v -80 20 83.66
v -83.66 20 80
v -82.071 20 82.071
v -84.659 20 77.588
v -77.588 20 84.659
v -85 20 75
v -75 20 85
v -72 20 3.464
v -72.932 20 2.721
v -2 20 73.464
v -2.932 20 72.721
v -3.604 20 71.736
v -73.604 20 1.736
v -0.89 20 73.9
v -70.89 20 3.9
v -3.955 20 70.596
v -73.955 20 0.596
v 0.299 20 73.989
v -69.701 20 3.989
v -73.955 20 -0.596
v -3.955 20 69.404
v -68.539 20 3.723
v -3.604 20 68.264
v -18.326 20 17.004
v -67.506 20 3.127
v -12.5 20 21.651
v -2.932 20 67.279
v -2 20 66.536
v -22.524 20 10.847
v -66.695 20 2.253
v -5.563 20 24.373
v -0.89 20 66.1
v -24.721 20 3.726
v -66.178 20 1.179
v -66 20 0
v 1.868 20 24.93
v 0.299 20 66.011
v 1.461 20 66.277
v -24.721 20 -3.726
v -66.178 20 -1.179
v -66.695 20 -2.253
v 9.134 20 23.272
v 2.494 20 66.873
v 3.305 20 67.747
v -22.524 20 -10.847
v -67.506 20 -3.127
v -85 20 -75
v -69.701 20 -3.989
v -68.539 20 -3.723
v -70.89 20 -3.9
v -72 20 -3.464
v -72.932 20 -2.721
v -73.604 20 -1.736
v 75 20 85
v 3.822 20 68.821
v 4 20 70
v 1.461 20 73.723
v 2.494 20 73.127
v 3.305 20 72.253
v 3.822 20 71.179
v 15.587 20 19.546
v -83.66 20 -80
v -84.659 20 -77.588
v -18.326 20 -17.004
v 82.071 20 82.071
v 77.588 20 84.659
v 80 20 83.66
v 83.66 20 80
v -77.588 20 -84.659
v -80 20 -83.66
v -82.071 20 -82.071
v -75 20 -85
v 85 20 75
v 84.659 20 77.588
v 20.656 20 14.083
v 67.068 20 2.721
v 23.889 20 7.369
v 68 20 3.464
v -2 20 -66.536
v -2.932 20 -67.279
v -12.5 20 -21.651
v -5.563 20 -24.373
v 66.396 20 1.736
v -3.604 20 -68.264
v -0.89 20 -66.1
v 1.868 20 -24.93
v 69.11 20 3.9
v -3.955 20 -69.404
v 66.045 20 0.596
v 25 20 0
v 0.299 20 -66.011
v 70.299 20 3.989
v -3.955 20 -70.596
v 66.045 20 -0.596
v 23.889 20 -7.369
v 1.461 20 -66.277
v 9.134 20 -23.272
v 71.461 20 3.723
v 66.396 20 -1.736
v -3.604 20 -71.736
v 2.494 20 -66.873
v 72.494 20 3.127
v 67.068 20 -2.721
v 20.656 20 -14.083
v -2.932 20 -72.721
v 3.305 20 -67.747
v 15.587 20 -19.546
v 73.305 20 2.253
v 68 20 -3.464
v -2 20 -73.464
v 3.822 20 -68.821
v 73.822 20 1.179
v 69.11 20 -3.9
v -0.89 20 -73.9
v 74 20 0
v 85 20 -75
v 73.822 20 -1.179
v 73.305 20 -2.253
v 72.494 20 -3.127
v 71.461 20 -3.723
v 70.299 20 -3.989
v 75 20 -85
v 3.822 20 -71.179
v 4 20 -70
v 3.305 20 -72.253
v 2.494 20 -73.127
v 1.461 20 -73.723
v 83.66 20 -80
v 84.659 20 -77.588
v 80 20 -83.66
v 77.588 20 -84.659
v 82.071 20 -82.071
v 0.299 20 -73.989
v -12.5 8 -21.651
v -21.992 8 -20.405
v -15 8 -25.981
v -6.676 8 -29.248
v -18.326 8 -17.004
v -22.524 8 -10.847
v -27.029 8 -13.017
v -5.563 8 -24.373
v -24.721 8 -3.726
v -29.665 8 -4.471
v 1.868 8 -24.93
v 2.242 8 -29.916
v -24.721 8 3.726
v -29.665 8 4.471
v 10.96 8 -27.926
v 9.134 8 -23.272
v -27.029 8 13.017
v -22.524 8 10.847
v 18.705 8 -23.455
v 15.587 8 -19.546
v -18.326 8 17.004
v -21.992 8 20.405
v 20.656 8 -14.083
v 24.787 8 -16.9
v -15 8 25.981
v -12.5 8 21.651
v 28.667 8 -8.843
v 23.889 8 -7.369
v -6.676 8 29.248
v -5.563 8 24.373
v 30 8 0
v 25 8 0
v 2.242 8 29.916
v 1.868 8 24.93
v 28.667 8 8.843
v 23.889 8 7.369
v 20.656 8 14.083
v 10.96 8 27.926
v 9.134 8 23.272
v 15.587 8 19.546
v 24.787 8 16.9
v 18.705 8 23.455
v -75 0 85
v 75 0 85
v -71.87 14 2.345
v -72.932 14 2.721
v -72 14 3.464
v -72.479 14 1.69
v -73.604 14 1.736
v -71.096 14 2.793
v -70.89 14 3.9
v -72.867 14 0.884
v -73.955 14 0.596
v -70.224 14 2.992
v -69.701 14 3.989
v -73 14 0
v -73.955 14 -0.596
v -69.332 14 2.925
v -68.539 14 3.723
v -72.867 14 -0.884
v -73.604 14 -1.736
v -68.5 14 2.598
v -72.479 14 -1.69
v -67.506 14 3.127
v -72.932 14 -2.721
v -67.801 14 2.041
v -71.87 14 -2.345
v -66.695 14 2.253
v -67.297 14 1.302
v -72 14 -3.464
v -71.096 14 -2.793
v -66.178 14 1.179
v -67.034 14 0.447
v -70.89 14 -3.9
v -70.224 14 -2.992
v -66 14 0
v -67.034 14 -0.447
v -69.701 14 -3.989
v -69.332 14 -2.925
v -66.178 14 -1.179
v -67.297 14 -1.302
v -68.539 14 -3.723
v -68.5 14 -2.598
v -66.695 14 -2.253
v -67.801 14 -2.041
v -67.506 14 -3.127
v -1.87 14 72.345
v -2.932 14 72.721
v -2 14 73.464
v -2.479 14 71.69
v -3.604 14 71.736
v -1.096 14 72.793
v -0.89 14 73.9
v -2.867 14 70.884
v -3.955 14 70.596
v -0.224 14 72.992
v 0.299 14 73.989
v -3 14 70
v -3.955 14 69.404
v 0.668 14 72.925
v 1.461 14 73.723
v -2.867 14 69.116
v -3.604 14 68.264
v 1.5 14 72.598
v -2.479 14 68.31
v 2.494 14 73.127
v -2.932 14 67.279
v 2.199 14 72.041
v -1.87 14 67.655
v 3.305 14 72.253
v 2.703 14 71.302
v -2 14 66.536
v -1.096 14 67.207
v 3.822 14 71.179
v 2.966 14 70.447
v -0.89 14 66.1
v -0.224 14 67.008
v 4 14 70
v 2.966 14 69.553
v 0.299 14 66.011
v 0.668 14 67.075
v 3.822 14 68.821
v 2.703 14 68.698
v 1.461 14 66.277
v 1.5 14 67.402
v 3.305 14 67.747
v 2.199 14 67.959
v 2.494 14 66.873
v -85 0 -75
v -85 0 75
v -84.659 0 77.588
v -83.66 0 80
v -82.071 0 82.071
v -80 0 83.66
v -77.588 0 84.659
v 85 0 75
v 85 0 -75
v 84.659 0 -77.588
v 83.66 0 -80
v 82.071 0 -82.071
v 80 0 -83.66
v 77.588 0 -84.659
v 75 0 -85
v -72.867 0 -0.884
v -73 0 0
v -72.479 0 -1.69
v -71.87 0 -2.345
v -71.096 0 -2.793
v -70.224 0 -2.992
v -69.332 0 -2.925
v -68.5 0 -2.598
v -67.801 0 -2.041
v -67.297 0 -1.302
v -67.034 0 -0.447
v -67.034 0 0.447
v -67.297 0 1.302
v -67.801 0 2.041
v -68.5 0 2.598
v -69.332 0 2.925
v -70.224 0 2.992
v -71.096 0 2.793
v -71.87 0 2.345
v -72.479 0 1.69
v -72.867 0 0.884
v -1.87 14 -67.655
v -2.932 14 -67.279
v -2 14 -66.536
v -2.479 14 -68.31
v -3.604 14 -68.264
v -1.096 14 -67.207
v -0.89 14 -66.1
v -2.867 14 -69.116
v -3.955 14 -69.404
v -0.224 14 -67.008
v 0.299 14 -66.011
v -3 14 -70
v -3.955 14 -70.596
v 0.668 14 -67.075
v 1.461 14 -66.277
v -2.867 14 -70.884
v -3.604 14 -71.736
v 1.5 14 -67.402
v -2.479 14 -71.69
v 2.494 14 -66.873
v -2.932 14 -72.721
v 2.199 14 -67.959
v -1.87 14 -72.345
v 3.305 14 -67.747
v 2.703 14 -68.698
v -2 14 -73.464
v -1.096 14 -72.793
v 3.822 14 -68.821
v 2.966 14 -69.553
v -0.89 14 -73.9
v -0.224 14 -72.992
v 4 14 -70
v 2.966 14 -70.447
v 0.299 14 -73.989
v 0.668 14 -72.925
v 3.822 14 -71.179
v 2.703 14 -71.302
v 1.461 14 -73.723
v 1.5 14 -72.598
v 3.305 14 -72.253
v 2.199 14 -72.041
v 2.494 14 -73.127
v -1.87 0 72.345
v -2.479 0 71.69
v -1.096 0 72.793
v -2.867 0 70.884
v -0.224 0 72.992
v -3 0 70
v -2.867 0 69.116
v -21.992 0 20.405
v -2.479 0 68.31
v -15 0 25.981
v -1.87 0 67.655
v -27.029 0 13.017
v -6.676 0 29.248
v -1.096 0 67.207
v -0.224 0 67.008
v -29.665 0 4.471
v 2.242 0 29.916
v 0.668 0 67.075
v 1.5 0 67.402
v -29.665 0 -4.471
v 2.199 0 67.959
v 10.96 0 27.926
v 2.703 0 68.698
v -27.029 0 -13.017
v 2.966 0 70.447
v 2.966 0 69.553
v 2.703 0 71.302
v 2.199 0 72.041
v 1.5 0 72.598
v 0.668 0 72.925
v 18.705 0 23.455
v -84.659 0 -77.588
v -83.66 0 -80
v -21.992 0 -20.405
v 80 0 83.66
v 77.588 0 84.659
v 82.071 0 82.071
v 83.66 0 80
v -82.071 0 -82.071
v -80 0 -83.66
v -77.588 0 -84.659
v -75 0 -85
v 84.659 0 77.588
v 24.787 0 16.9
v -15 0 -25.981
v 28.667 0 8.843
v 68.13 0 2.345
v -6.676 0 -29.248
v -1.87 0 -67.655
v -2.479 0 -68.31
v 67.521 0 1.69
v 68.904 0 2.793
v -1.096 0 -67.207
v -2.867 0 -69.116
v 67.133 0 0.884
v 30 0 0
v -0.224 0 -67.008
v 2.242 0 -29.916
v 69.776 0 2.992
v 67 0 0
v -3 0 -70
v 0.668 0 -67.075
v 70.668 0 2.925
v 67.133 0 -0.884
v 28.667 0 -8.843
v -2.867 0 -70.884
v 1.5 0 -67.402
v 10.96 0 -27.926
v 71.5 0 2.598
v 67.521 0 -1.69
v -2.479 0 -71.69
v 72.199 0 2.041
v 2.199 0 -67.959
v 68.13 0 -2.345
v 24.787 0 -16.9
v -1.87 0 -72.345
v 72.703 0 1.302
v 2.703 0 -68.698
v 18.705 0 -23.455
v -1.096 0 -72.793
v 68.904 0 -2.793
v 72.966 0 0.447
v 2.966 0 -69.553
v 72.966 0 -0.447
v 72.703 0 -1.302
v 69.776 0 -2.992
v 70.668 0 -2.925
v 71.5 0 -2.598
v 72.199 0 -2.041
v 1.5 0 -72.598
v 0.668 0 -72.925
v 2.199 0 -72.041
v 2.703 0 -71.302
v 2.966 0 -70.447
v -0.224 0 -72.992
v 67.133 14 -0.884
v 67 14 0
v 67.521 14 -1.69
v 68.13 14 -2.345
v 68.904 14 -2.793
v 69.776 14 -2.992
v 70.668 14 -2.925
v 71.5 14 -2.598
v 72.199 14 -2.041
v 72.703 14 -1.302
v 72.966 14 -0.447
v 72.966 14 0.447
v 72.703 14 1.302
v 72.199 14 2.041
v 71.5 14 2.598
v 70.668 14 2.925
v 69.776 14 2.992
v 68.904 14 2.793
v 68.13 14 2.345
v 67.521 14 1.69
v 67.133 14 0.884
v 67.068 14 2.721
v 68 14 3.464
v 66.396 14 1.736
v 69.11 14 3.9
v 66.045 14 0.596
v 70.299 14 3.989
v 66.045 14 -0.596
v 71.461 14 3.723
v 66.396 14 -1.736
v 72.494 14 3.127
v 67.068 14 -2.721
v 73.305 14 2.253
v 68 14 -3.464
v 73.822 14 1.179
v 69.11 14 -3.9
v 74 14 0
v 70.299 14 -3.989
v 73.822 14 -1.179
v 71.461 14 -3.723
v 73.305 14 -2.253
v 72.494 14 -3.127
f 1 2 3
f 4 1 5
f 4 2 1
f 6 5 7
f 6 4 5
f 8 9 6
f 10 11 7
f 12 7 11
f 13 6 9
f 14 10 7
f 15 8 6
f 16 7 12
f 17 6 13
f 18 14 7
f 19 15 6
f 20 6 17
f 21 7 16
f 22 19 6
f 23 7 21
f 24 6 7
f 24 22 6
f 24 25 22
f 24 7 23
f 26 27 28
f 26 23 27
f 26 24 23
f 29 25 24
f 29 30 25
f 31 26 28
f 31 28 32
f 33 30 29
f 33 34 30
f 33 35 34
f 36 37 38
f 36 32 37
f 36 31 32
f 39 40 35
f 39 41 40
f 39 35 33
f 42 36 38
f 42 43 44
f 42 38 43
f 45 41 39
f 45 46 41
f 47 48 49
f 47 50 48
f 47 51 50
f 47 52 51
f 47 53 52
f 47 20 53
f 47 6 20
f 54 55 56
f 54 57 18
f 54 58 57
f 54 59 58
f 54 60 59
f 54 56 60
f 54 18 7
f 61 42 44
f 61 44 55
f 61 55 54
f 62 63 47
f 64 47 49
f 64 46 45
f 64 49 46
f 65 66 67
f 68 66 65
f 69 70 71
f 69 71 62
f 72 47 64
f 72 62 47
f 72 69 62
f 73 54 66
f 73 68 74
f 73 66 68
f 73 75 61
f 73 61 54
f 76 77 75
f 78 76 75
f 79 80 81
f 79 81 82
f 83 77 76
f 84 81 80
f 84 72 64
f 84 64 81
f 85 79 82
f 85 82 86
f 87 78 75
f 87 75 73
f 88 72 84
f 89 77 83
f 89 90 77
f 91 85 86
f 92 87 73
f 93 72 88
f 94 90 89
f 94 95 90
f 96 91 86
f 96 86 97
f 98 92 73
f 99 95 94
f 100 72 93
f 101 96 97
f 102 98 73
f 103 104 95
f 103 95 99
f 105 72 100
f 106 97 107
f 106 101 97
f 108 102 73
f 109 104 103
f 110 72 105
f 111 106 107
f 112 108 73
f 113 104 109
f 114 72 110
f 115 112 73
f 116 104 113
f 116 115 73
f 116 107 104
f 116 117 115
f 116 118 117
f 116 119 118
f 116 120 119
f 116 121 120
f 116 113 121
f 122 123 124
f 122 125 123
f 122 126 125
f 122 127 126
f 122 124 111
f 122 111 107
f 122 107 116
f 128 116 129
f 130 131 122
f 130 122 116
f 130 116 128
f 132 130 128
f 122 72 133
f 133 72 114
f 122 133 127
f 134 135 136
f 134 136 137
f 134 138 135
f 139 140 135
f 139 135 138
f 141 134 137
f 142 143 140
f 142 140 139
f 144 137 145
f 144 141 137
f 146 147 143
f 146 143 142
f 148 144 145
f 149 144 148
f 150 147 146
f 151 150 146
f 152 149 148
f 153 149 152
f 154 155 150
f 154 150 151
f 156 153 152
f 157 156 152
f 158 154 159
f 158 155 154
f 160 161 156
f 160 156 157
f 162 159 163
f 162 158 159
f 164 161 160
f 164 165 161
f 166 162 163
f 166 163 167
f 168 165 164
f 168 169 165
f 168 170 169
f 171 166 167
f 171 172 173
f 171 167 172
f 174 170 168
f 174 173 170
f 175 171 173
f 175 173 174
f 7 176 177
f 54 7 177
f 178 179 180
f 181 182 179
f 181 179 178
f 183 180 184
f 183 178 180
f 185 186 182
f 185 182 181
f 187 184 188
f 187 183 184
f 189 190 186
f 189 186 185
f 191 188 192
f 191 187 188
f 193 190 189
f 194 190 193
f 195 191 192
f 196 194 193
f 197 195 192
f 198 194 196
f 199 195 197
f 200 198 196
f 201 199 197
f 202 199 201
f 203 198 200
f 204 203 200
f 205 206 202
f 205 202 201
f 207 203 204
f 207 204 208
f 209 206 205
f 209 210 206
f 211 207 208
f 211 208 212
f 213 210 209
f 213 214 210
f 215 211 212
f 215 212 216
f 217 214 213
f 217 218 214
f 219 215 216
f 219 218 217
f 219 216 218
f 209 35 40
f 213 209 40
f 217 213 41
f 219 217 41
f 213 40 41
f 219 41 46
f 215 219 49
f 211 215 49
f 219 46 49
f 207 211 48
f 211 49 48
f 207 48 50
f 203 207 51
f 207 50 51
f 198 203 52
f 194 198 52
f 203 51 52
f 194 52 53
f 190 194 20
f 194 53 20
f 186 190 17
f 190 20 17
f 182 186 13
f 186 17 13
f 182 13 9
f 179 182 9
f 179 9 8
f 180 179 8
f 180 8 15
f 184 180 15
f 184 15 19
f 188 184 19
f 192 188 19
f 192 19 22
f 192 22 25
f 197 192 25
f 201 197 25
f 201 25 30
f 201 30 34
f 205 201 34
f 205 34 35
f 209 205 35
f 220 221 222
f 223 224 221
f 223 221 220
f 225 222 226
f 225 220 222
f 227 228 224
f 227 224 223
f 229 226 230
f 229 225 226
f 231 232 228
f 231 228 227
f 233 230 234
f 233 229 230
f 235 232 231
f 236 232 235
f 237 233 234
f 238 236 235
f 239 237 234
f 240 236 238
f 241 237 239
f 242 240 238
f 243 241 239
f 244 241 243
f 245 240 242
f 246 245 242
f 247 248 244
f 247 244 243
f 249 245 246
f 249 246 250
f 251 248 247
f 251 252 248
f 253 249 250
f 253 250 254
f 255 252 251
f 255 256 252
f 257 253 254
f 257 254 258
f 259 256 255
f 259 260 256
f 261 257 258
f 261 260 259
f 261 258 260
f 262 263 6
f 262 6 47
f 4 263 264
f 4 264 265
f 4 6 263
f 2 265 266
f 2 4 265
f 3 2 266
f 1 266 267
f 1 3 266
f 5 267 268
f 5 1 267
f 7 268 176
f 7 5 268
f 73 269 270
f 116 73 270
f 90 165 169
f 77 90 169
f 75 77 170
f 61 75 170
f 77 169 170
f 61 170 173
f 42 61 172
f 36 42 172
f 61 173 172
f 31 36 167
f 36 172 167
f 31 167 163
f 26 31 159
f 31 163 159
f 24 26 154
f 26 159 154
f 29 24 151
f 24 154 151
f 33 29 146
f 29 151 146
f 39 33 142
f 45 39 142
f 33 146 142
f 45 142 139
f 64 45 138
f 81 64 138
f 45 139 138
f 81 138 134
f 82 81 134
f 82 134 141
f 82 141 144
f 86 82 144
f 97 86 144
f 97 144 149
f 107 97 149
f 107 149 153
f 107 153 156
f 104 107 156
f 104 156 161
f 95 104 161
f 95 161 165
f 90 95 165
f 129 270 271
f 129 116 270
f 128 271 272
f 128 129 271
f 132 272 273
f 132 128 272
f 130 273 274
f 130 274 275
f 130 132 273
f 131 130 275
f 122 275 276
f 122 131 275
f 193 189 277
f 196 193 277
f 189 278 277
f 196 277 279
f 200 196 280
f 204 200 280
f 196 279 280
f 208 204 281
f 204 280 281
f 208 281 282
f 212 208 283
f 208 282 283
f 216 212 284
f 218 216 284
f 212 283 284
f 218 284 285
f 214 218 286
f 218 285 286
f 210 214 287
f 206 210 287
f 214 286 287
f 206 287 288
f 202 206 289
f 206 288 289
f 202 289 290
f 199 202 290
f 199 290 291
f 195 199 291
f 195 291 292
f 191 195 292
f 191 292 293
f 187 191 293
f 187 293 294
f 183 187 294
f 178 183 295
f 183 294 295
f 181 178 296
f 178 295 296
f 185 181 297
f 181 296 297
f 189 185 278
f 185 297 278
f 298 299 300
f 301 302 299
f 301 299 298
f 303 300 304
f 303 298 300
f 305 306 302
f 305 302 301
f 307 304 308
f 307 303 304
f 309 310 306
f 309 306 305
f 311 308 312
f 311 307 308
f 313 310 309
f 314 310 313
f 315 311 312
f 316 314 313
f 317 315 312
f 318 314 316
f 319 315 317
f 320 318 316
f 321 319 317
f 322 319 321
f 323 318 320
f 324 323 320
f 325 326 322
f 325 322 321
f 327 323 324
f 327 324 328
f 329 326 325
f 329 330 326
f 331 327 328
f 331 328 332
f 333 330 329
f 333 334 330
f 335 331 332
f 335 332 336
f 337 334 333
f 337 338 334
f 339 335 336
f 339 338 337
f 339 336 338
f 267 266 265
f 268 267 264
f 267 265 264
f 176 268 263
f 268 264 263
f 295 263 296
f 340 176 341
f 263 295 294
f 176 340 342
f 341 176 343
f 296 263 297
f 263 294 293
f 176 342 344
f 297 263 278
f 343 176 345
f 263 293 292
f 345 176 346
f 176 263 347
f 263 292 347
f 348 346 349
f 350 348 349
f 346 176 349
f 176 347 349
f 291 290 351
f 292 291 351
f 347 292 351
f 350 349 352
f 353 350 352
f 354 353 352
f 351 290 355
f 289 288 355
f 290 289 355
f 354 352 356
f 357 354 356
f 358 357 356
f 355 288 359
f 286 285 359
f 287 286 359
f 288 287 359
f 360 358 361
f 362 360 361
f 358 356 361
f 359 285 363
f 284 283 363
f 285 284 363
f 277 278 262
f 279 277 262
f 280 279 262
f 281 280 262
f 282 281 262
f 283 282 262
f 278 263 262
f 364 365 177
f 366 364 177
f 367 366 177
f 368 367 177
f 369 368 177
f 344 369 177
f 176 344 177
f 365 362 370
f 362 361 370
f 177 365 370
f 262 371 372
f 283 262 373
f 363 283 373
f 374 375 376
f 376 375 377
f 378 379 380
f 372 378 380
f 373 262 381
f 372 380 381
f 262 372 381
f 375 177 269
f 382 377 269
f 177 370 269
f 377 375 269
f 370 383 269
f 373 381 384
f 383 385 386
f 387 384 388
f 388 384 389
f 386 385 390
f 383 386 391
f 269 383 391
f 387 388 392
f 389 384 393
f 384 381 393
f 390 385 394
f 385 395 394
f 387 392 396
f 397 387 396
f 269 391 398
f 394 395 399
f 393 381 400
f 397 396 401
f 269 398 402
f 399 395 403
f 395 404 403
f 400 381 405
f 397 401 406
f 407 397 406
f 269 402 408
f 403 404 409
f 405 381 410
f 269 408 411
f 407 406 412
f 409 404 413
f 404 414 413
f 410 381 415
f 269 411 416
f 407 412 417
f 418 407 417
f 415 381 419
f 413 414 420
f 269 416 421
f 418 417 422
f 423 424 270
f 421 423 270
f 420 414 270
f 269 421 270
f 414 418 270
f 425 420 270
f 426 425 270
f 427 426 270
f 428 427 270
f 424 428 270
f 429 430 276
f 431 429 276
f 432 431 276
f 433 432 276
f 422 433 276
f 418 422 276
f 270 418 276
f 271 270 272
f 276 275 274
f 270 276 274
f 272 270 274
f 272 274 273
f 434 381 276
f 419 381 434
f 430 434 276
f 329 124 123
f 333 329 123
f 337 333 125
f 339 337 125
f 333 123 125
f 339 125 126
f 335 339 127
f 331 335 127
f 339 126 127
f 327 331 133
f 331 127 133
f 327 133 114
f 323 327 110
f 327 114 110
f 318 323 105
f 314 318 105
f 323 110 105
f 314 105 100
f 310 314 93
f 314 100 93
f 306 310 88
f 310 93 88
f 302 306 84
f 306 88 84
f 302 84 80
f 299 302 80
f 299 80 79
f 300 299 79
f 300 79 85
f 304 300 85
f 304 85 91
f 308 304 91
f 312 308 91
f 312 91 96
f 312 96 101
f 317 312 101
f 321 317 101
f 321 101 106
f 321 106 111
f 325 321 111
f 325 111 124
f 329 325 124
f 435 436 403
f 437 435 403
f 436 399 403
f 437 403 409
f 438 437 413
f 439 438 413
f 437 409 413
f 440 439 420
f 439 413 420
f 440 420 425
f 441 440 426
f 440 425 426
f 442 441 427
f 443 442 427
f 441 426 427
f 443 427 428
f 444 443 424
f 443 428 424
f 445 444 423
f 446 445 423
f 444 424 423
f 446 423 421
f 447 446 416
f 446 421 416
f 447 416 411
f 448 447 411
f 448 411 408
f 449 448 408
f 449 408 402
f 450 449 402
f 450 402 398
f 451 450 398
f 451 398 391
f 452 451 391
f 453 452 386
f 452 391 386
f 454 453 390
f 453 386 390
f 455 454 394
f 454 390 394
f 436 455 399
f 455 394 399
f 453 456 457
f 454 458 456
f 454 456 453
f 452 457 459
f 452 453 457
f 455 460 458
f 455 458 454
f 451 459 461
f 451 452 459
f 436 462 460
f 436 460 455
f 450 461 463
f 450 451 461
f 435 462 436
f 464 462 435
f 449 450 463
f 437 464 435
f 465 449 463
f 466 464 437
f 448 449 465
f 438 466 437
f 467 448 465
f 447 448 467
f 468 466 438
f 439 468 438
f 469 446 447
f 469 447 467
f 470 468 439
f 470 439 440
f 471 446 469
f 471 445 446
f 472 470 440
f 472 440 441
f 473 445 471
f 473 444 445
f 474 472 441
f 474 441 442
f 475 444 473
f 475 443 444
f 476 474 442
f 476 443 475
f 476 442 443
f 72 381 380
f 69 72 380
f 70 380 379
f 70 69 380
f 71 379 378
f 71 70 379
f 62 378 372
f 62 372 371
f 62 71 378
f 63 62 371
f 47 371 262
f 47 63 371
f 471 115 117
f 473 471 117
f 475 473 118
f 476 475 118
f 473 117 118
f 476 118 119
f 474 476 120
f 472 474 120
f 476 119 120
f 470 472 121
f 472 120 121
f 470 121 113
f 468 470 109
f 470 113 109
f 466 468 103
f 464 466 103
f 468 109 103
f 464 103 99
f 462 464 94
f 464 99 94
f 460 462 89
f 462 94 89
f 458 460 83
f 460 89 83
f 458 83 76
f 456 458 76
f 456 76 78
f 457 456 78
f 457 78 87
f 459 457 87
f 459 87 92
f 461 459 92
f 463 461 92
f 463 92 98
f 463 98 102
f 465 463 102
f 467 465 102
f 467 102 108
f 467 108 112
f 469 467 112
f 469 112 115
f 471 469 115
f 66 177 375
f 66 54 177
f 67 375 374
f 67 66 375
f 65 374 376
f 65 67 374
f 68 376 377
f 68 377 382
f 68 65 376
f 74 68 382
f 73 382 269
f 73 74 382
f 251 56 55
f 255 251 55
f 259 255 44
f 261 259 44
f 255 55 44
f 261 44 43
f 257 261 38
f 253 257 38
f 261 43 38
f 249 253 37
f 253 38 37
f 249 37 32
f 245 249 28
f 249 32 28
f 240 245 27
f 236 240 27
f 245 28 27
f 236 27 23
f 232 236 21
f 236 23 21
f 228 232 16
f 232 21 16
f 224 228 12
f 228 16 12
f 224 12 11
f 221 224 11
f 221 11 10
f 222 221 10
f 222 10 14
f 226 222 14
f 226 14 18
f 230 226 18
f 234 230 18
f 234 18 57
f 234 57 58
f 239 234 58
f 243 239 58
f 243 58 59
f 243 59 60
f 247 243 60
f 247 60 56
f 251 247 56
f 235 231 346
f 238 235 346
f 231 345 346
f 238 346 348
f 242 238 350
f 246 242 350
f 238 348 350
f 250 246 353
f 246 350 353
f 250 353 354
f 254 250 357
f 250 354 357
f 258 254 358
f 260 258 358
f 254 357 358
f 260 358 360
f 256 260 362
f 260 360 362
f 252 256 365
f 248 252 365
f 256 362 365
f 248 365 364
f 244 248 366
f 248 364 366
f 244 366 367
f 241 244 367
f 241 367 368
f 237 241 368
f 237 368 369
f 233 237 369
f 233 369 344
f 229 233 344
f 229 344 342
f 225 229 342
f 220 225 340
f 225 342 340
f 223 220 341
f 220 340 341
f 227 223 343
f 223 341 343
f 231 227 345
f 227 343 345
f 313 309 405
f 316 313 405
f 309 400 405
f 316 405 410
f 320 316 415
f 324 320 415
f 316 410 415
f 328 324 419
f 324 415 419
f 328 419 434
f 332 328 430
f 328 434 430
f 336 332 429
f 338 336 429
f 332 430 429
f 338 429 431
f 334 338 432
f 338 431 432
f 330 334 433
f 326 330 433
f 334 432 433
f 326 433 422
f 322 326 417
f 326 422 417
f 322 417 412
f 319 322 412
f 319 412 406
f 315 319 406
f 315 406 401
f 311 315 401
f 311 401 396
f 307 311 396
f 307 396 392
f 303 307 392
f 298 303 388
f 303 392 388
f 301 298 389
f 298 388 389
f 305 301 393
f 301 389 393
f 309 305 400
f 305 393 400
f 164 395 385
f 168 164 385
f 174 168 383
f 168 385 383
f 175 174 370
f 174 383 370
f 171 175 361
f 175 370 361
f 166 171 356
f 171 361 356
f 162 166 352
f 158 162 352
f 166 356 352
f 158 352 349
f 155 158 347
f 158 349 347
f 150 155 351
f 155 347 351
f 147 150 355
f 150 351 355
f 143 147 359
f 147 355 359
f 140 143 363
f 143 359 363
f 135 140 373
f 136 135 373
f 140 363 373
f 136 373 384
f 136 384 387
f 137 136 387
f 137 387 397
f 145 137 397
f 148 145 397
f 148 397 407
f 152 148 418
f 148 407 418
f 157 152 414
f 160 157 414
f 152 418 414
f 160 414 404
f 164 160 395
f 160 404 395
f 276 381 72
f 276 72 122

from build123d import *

# Parameters (mm, degrees)
SKETCH2_W                               = 170
SKETCH2_H                               = 170
BOSS_EXTRUDE1_DEPTH                     = 20
FILLET1_R                               = 10
FILLET2_R                               = 10
FILLET3_R                               = 10
FILLET4_R                               = 10
SKETCH11_R                              = 30
CUT_EXTRUDE3_DEPTH                      = 8
SKETCH16_R                              = 25
CUT_EXTRUDE4_DEPTH                      = 96
CBORE_FOR_M5_HEX_HEAD_BOLT4_D           = 6
CBORE_FOR_M5_HEX_HEAD_BOLT4_CBORE_D     = 8
CBORE_FOR_M5_HEX_HEAD_BOLT4_CBORE_DEPTH = 6


with BuildPart() as part:
    # Sketch2 → Boss-Extrude1 (new body)
    with BuildSketch(Plane(origin=(0, 0, 0), x_dir=(1, 0, 0), z_dir=(0, 1, 0))):
        Rectangle(SKETCH2_W, SKETCH2_H)
    extrude(amount=BOSS_EXTRUDE1_DEPTH)

    # Fillet1
    fillet1_edges = [part.edges().sort_by_distance(p)[0] for p in [
        (85, 10, 85),
    ]]
    fillet(fillet1_edges, radius=FILLET1_R)

    # Fillet2
    fillet2_edges = [part.edges().sort_by_distance(p)[0] for p in [
        (85, 10, -85),
    ]]
    fillet(fillet2_edges, radius=FILLET2_R)

    # Fillet3
    fillet3_edges = [part.edges().sort_by_distance(p)[0] for p in [
        (-85, 10, -85),
    ]]
    fillet(fillet3_edges, radius=FILLET3_R)

    # Fillet4
    fillet4_edges = [part.edges().sort_by_distance(p)[0] for p in [
        (-85, 10, 85),
    ]]
    fillet(fillet4_edges, radius=FILLET4_R)

    # Sketch11 → Cut-Extrude3 (cut)
    with BuildSketch(Plane.XZ):
        Circle(SKETCH11_R)
    extrude(amount=-CUT_EXTRUDE3_DEPTH, mode=Mode.SUBTRACT)

    # Sketch16 → Cut-Extrude4 (cut)
    with BuildSketch(Plane.XZ.offset(-8)):
        Circle(SKETCH16_R)
    extrude(amount=-CUT_EXTRUDE4_DEPTH, mode=Mode.SUBTRACT)

    # CBORE for M5 Hex Head Bolt4 (through all)
    with Locations(Plane(origin=(0, 20, 0), x_dir=(1, 0, 0), z_dir=(0, 1, 0))):
        with Locations((0, 70), (0, -70), (70, 0), (-70, 0)):
            CounterBoreHole(CBORE_FOR_M5_HEX_HEAD_BOLT4_D / 2, CBORE_FOR_M5_HEX_HEAD_BOLT4_CBORE_D / 2, CBORE_FOR_M5_HEX_HEAD_BOLT4_CBORE_DEPTH)


solid = part.part
